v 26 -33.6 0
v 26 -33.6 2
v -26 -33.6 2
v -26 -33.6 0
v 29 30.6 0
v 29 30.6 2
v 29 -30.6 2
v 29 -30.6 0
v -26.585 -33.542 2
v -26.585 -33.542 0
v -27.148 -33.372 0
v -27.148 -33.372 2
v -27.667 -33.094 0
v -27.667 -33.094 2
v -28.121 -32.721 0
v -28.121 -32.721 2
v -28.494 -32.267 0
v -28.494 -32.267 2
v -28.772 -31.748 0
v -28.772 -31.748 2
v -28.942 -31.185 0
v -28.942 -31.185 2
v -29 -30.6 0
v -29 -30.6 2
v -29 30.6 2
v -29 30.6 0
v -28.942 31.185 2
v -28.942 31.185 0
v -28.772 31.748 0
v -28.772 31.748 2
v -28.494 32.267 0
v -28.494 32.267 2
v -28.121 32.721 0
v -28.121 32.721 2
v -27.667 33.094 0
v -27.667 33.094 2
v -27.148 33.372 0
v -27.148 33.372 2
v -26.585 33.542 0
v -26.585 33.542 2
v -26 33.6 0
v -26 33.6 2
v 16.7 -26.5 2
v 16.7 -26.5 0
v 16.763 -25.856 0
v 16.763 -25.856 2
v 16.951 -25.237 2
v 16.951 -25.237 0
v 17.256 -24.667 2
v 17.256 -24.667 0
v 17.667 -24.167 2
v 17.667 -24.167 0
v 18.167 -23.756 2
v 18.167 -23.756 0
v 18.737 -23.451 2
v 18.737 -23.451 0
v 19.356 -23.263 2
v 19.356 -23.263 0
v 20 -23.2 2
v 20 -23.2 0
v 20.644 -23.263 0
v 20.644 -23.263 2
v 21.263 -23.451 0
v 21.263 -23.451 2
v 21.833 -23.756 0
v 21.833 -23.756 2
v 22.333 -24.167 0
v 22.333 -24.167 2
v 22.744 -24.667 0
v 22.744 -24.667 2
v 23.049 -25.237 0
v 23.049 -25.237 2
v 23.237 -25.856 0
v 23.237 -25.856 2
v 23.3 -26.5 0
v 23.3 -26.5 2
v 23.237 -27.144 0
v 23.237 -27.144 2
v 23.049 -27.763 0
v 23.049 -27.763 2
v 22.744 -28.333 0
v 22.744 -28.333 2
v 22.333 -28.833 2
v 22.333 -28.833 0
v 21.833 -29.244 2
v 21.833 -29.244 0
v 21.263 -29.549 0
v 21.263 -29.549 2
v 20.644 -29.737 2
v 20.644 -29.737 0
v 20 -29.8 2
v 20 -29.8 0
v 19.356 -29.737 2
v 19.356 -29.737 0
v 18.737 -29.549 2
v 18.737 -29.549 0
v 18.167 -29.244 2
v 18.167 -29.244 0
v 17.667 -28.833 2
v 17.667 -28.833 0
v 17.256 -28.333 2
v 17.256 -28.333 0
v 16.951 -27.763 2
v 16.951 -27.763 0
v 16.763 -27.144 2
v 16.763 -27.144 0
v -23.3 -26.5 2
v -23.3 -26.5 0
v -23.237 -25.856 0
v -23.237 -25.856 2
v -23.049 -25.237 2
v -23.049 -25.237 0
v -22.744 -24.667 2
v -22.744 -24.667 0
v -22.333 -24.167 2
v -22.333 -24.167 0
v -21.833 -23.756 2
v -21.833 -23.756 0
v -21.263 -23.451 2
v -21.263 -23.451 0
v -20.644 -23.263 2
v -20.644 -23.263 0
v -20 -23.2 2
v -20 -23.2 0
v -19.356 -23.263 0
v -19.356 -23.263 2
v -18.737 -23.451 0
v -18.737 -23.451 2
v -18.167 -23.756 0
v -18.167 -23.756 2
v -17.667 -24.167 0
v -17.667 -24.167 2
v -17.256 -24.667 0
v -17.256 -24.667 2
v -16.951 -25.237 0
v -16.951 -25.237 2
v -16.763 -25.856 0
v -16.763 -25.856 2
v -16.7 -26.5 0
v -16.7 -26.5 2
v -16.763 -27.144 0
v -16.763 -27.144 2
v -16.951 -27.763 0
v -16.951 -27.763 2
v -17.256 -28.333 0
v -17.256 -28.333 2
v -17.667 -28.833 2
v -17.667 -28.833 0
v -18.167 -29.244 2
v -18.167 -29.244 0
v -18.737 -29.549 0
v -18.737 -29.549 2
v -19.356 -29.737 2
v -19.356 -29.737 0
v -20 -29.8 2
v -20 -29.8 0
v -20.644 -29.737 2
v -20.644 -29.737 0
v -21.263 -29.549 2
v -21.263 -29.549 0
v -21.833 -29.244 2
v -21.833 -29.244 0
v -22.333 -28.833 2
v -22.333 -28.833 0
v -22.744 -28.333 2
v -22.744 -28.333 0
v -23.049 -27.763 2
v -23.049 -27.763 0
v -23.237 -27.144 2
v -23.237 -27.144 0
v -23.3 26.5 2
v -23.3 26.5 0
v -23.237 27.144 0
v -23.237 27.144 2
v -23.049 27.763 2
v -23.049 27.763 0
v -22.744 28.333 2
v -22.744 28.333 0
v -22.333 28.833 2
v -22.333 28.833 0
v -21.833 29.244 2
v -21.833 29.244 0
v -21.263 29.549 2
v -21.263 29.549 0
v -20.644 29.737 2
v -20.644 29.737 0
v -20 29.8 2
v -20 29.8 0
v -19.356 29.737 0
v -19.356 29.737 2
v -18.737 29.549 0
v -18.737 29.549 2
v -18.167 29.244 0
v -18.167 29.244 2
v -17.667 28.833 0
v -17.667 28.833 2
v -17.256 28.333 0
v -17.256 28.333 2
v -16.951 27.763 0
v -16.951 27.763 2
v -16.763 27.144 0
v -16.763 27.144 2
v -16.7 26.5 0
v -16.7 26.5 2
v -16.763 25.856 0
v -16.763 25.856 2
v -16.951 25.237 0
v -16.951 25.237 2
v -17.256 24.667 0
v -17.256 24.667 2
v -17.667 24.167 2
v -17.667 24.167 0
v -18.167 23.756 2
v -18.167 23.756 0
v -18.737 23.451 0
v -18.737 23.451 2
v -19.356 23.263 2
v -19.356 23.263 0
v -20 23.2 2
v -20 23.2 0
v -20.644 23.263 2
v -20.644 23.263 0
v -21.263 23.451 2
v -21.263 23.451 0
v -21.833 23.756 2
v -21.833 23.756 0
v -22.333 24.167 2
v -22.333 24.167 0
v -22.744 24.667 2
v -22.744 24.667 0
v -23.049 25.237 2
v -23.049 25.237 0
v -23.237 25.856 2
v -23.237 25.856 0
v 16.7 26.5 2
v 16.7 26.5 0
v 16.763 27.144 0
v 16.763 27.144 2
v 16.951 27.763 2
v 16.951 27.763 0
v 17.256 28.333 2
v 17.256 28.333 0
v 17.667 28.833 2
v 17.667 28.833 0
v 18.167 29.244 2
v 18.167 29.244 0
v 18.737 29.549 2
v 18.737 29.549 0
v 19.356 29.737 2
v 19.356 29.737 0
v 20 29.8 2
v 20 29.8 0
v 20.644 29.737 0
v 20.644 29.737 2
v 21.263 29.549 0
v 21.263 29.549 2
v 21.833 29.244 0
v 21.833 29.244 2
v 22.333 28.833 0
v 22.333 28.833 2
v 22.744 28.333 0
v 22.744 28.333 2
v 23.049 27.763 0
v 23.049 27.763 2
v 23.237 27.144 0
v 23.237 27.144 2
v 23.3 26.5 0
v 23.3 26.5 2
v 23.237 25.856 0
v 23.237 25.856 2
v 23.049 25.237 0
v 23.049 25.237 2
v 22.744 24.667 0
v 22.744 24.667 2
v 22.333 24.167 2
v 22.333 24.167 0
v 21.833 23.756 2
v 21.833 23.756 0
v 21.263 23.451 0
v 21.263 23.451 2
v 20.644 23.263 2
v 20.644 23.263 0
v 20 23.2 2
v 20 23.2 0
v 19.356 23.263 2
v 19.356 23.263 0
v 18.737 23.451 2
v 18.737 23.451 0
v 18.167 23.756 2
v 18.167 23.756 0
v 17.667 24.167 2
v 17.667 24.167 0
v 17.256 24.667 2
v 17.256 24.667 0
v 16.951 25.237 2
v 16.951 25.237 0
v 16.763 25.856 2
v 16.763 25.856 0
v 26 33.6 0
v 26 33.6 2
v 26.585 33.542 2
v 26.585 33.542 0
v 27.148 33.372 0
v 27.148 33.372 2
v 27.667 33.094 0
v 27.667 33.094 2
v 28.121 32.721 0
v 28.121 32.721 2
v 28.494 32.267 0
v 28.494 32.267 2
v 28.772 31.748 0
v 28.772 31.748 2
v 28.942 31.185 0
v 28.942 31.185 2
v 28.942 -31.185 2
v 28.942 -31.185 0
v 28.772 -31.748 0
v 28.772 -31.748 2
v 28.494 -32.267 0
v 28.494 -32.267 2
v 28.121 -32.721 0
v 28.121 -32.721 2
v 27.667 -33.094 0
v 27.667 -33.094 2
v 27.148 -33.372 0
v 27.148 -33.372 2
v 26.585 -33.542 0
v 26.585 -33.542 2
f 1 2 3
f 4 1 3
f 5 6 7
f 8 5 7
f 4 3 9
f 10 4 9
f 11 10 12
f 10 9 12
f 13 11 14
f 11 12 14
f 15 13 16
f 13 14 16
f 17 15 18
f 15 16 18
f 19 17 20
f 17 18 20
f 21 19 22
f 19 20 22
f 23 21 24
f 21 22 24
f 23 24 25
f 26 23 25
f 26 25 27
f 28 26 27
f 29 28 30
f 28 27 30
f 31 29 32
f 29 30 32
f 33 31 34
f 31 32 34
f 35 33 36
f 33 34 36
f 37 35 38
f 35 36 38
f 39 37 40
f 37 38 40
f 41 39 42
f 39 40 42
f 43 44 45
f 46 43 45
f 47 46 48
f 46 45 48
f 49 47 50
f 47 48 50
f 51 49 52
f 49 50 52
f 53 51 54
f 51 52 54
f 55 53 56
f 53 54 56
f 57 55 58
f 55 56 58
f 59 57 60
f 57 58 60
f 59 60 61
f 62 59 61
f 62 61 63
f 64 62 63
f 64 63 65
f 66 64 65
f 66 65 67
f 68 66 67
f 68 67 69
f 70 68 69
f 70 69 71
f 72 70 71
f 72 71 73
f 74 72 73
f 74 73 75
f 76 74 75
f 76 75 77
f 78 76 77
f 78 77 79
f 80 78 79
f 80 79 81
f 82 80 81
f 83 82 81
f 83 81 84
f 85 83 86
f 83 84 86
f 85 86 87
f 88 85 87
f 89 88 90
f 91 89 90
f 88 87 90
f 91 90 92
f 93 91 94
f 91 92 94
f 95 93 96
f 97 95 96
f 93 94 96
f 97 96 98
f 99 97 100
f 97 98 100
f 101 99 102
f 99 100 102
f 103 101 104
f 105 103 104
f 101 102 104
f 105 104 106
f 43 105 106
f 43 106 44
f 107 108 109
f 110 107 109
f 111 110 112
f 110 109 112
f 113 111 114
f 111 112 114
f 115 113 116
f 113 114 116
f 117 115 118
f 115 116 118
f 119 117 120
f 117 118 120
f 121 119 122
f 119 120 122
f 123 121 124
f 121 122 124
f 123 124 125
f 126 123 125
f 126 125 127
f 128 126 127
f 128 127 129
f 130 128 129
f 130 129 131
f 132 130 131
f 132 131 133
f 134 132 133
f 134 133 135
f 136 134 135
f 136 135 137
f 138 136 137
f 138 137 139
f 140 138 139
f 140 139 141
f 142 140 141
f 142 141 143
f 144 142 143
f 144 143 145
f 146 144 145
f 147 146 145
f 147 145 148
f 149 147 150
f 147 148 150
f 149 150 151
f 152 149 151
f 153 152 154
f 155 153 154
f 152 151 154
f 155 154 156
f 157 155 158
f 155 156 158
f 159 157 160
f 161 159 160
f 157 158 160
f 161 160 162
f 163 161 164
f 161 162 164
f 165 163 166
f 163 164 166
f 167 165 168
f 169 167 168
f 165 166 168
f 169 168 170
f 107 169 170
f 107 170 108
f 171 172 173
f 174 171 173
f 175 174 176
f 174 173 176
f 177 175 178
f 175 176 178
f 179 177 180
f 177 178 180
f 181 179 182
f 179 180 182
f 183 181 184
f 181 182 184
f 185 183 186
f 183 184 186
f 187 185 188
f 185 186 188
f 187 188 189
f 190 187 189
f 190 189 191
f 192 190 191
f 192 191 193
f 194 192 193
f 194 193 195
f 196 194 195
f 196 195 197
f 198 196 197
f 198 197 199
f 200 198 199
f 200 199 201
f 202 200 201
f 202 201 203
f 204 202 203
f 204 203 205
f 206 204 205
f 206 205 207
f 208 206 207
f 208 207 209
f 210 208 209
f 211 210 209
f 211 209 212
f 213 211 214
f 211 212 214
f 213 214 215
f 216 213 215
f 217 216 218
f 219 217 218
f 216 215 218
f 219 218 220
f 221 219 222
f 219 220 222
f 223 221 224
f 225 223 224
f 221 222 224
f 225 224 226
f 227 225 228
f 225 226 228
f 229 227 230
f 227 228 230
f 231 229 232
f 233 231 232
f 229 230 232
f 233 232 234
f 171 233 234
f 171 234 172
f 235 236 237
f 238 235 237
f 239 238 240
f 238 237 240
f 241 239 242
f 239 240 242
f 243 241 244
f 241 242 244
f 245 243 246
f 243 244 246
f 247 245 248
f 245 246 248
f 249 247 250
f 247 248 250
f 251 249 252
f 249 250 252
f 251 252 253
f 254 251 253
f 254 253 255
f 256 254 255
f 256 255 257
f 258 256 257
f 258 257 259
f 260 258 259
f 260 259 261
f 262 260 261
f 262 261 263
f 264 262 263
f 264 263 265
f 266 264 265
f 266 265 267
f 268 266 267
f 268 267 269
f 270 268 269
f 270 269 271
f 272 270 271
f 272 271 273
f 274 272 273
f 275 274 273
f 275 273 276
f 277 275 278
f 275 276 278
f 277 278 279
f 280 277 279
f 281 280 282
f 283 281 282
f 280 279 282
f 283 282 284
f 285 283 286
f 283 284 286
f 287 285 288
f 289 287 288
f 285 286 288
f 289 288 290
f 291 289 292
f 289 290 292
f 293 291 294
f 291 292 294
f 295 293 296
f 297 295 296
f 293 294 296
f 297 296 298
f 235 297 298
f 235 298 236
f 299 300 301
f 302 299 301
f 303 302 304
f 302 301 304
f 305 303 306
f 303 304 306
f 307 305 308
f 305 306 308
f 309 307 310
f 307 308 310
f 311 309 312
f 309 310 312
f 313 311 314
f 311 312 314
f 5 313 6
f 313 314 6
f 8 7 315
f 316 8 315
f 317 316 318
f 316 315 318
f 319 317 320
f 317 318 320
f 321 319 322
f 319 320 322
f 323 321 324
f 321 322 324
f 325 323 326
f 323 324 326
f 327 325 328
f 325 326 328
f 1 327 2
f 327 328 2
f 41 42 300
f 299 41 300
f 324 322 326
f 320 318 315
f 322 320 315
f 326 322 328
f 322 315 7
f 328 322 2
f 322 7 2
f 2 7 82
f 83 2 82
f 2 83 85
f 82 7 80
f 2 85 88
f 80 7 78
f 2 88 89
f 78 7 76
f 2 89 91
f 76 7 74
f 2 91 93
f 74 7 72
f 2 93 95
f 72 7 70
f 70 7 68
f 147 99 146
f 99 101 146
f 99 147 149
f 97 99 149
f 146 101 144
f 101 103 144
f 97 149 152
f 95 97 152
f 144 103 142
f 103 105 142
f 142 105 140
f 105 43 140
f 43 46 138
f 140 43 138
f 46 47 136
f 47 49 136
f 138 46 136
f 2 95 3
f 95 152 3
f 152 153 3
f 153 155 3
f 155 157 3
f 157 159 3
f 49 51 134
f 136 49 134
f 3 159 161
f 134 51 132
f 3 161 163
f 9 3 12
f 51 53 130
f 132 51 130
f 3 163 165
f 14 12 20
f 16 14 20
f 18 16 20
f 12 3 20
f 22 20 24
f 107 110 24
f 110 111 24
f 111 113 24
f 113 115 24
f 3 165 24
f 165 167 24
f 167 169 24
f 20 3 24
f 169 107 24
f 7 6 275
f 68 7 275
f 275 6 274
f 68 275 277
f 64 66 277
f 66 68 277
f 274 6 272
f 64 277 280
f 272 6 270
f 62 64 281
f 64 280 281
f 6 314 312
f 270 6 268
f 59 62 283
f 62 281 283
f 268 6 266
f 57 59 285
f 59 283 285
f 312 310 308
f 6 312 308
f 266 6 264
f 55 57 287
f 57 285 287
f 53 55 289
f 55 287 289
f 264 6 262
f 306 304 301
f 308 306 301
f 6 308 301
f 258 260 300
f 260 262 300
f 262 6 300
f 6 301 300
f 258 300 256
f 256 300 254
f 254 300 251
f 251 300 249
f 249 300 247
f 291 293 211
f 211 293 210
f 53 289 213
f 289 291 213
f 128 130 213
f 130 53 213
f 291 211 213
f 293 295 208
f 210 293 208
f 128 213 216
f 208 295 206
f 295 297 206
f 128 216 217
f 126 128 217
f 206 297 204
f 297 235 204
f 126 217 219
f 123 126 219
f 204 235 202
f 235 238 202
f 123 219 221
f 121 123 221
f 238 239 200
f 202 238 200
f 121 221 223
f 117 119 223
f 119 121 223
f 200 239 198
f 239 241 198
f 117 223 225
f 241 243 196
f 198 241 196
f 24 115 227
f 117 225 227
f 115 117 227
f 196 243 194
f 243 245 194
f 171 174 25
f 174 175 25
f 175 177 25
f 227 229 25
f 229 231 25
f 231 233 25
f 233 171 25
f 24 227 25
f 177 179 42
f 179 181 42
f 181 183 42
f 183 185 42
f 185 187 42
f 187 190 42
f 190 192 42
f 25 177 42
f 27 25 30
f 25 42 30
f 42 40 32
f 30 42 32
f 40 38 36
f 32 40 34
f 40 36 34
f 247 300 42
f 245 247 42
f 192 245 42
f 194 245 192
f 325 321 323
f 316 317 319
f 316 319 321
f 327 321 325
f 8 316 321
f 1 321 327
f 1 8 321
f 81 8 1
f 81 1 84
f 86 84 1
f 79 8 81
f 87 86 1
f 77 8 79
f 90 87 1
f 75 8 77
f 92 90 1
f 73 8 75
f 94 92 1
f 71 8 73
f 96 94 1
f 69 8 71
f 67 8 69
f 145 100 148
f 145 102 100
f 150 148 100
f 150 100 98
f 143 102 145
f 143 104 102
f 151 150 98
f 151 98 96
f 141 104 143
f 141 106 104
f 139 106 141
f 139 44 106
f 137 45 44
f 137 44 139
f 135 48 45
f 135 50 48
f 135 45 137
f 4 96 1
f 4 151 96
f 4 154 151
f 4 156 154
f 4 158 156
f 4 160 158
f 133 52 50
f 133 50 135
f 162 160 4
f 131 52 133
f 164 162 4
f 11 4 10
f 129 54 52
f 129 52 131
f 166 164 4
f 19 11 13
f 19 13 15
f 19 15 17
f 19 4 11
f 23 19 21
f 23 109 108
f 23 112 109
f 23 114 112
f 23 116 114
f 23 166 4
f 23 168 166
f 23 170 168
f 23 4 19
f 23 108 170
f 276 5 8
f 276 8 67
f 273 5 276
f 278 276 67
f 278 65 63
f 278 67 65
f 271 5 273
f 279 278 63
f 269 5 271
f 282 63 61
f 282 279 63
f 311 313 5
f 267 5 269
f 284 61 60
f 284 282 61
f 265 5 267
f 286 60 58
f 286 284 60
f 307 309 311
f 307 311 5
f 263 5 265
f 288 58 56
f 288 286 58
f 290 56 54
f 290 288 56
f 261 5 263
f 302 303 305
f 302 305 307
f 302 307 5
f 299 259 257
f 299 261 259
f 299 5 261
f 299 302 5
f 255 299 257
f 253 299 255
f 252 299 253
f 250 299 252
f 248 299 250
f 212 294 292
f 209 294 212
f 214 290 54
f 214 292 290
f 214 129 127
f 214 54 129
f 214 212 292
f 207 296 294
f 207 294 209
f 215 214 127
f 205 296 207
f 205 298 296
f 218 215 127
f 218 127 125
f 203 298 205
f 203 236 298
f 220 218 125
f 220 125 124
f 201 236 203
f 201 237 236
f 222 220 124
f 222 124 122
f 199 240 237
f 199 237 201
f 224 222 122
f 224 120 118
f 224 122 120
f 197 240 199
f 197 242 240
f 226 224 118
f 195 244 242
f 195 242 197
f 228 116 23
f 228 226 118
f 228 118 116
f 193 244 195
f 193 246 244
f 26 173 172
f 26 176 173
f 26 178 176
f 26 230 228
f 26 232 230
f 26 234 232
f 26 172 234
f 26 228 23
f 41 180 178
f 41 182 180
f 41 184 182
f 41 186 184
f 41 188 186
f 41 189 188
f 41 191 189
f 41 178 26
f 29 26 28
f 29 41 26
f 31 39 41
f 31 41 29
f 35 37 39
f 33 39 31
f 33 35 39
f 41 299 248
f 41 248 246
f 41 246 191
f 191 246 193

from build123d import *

# Parameters (mm, degrees)
SKETCH1_W            = 52
SKETCH1_H            = 61.2
BOSS_EXTRUDE1_DEPTH  = 2
M6_CLEARANCE_HOLE1_D = 6.6
SKETCH4_W            = 52
SKETCH4_H            = 61.2
BOSS_EXTRUDE2_DEPTH  = 2


with BuildPart() as part:
    # Sketch1 → Boss-Extrude1 (new body)
    with BuildSketch(Plane.XY):
        Rectangle(SKETCH1_W, SKETCH1_H)
    extrude(amount=BOSS_EXTRUDE1_DEPTH)

    # M6 Clearance Hole1 (through all)
    with Locations(Plane.XY.offset(2)):
        with Locations((20, -26.5), (-20, -26.5), (-20, 26.5), (20, 26.5)):
            Hole(M6_CLEARANCE_HOLE1_D / 2)

    # Sketch4 → Boss-Extrude2 (add)
    with BuildSketch(Plane.XY.offset(2)):
        with BuildLine():
            Line((-26, 33.6), (26, 33.6))
            ThreePointArc((26, 33.6), (28.121320344, 32.721320344), (29, 30.6))
            Line((29, 30.6), (29, -30.6))
            ThreePointArc((29, -30.6), (28.121320344, -32.721320344), (26, -33.6))
            Line((26, -33.6), (-26, -33.6))
            ThreePointArc((-26, -33.6), (-28.121320344, -32.721320344), (-29, -30.6))
            Line((-29, -30.6), (-29, 30.6))
            ThreePointArc((-29, 30.6), (-28.121320344, 32.721320344), (-26, 33.6))
        make_face()
        Rectangle(SKETCH4_W, SKETCH4_H, mode=Mode.SUBTRACT)
    extrude(amount=-BOSS_EXTRUDE2_DEPTH)


solid = part.part
